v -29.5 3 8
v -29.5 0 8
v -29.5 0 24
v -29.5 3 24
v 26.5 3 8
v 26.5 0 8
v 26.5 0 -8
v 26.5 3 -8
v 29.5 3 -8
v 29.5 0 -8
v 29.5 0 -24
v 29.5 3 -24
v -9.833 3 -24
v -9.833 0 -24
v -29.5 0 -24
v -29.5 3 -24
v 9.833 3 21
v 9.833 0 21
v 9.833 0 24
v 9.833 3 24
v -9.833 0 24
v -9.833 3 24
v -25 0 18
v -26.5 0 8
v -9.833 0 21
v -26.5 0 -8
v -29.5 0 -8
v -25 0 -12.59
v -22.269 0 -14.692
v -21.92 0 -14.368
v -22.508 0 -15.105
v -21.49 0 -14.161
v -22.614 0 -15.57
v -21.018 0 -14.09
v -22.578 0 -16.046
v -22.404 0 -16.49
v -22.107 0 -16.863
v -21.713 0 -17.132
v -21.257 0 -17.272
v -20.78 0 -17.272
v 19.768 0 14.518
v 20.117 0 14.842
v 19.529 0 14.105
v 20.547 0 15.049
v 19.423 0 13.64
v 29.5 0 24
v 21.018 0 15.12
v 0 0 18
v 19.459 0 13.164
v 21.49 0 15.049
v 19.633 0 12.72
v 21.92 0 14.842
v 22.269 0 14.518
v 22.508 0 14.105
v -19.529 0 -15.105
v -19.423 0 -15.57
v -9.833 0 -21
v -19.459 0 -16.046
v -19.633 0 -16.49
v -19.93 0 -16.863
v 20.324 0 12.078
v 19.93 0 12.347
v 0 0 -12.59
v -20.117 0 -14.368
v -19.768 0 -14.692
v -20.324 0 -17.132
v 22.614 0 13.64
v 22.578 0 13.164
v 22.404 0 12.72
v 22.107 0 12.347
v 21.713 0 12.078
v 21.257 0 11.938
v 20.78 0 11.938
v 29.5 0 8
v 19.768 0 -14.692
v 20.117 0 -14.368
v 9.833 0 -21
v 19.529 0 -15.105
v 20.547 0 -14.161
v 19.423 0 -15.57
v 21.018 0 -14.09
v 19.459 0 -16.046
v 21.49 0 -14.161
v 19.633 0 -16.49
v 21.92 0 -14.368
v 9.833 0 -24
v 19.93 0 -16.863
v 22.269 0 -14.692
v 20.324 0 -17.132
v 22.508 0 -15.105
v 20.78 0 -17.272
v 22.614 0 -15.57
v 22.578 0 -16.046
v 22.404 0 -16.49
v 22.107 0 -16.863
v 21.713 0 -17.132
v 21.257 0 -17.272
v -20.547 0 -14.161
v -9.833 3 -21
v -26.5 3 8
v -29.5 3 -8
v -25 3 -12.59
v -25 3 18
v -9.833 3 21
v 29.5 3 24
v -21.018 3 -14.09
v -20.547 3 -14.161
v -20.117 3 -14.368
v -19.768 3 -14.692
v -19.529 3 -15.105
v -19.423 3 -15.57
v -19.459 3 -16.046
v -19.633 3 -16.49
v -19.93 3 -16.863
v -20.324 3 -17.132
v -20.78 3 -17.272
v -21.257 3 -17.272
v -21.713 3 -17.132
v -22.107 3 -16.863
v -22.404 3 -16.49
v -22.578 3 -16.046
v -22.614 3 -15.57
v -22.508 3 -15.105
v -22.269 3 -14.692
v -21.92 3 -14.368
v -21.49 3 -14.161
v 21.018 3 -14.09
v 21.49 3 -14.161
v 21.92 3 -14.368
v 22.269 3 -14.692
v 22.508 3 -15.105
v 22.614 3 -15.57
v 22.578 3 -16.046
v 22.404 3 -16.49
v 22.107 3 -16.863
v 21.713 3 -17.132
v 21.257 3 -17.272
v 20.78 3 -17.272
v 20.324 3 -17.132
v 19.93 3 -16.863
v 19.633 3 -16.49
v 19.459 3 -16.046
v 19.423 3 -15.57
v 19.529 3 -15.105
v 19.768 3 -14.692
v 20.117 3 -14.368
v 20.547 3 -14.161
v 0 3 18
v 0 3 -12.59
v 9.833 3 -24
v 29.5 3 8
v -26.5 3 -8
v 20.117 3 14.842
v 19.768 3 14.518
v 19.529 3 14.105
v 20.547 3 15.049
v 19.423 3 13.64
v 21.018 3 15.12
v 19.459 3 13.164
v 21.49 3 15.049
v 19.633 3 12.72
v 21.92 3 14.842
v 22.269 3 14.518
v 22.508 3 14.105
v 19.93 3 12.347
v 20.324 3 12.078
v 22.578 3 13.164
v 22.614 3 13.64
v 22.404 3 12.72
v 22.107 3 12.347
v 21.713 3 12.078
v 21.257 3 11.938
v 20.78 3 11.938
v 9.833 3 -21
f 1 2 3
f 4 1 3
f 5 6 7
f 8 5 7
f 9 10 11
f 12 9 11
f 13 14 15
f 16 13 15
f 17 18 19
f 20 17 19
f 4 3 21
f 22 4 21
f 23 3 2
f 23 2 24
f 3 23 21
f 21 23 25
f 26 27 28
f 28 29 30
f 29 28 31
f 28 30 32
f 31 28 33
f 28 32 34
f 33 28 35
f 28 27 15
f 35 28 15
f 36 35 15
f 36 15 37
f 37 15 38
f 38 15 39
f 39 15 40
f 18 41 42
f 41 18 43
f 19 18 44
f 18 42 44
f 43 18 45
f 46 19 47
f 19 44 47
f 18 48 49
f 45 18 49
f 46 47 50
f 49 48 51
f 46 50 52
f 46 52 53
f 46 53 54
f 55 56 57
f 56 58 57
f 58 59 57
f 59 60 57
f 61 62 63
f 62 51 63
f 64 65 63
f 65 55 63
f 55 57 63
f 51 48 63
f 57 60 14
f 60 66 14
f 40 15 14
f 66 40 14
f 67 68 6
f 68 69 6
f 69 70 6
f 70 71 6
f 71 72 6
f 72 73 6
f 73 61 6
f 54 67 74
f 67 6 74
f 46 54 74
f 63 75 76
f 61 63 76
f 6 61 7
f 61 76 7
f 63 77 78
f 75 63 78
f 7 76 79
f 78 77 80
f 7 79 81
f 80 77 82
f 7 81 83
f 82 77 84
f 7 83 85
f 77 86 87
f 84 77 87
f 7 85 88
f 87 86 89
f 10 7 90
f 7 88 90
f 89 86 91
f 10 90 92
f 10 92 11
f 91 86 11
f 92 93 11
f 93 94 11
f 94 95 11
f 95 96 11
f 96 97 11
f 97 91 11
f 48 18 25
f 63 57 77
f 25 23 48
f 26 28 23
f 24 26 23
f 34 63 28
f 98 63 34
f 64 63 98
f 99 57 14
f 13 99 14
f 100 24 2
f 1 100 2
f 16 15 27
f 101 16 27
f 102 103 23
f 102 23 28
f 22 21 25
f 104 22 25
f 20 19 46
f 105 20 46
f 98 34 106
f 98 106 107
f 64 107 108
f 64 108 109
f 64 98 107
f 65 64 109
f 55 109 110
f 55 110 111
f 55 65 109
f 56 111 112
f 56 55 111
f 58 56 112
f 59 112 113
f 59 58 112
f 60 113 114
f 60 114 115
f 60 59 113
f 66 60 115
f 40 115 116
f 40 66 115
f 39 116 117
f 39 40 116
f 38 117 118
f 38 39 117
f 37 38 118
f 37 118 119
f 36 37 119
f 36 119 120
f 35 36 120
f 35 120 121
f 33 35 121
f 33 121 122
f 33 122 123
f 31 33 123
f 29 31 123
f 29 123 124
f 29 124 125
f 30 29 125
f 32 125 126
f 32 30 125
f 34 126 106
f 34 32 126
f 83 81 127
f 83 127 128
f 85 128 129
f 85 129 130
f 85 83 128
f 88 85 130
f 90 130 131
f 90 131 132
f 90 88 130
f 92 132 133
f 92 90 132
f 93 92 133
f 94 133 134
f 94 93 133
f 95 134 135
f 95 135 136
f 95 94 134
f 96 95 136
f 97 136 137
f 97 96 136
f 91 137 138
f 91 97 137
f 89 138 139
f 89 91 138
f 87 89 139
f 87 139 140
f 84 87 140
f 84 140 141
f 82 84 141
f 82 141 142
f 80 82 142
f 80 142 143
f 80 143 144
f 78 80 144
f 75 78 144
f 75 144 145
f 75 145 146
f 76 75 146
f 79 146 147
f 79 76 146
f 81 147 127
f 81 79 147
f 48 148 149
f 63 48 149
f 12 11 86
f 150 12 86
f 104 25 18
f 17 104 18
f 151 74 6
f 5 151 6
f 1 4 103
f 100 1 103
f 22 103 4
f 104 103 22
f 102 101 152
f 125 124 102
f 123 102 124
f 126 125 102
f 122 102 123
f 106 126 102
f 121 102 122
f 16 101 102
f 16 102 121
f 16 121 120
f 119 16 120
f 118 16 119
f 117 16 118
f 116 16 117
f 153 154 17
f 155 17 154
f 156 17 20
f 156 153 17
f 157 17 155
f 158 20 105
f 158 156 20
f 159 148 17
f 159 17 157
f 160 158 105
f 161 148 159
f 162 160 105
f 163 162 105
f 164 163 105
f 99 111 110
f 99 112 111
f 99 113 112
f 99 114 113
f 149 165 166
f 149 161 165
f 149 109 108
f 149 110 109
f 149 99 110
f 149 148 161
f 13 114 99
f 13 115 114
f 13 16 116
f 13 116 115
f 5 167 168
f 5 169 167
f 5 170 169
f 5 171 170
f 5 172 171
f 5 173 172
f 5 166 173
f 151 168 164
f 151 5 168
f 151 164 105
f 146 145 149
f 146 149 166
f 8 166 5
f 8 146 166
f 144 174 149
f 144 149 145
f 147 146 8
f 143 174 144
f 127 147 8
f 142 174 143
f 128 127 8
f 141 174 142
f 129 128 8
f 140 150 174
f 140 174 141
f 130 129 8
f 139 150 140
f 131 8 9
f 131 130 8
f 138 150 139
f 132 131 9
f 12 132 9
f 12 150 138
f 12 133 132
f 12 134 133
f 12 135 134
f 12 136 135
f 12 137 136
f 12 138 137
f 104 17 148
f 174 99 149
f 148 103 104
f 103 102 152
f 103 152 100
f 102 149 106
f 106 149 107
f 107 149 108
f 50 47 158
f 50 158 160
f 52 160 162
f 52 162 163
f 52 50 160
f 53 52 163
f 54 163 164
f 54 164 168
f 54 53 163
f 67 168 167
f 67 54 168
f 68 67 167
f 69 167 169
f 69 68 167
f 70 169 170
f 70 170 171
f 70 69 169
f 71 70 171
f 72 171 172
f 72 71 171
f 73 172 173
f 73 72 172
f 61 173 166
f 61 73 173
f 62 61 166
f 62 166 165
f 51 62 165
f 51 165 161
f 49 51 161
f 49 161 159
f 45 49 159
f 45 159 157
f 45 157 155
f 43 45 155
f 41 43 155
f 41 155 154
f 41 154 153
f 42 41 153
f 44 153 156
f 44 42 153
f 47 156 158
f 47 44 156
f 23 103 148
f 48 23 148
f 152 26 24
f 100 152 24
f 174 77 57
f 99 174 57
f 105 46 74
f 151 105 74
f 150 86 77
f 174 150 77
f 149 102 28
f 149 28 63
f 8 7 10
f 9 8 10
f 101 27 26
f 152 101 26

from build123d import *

# Parameters (mm, degrees)
SKETCH1_R           = 1.6
BOSS_EXTRUDE1_DEPTH = 3
SKETCH2_W           = 25
SKETCH2_H           = 30.59
CUT_EXTRUDE1_DEPTH  = 39.14773912


with BuildPart() as part:
    # Sketch1 → Boss-Extrude1 (new body)
    with BuildSketch(Plane(origin=(0, 0, 0), x_dir=(1, 0, 0), z_dir=(0, 1, 0))):
        Polygon((-29.5, 24), (-29.5, 8), (-26.5, 8), (-26.5, -8), (-29.5, -8), (-29.5, -24), (-9.833333333, -24), (-9.833333333, -21), (9.833333333, -21), (9.833333333, -24), (29.5, -24), (29.5, -8), (26.5, -8), (26.5, 8), (29.5, 8), (29.5, 24), (9.833333333, 24), (9.833333333, 21), (-9.833333333, 21), (-9.833333333, 24), align=None)
        with Locations(Location((-21.0185, 15.69, 0), (0, 0, 270))):
            Circle(SKETCH1_R, mode=Mode.SUBTRACT)
        with Locations(Location((21.0185, 15.69, 0), (0, 0, 270))):
            Circle(SKETCH1_R, mode=Mode.SUBTRACT)
        with Locations(Location((21.0185, -13.52, 0), (0, 0, 270))):
            Circle(SKETCH1_R, mode=Mode.SUBTRACT)
    extrude(amount=BOSS_EXTRUDE1_DEPTH)

    # Sketch2 → Cut-Extrude1 (cut, through all)
    with BuildSketch(Plane(origin=(0, 3, 0), x_dir=(1, 0, 0), z_dir=(0, 1, 0))):
        with Locations((-12.5, -2.705)):
            Rectangle(SKETCH2_W, SKETCH2_H)
    extrude(amount=-CUT_EXTRUDE1_DEPTH, mode=Mode.SUBTRACT)


solid = part.part
